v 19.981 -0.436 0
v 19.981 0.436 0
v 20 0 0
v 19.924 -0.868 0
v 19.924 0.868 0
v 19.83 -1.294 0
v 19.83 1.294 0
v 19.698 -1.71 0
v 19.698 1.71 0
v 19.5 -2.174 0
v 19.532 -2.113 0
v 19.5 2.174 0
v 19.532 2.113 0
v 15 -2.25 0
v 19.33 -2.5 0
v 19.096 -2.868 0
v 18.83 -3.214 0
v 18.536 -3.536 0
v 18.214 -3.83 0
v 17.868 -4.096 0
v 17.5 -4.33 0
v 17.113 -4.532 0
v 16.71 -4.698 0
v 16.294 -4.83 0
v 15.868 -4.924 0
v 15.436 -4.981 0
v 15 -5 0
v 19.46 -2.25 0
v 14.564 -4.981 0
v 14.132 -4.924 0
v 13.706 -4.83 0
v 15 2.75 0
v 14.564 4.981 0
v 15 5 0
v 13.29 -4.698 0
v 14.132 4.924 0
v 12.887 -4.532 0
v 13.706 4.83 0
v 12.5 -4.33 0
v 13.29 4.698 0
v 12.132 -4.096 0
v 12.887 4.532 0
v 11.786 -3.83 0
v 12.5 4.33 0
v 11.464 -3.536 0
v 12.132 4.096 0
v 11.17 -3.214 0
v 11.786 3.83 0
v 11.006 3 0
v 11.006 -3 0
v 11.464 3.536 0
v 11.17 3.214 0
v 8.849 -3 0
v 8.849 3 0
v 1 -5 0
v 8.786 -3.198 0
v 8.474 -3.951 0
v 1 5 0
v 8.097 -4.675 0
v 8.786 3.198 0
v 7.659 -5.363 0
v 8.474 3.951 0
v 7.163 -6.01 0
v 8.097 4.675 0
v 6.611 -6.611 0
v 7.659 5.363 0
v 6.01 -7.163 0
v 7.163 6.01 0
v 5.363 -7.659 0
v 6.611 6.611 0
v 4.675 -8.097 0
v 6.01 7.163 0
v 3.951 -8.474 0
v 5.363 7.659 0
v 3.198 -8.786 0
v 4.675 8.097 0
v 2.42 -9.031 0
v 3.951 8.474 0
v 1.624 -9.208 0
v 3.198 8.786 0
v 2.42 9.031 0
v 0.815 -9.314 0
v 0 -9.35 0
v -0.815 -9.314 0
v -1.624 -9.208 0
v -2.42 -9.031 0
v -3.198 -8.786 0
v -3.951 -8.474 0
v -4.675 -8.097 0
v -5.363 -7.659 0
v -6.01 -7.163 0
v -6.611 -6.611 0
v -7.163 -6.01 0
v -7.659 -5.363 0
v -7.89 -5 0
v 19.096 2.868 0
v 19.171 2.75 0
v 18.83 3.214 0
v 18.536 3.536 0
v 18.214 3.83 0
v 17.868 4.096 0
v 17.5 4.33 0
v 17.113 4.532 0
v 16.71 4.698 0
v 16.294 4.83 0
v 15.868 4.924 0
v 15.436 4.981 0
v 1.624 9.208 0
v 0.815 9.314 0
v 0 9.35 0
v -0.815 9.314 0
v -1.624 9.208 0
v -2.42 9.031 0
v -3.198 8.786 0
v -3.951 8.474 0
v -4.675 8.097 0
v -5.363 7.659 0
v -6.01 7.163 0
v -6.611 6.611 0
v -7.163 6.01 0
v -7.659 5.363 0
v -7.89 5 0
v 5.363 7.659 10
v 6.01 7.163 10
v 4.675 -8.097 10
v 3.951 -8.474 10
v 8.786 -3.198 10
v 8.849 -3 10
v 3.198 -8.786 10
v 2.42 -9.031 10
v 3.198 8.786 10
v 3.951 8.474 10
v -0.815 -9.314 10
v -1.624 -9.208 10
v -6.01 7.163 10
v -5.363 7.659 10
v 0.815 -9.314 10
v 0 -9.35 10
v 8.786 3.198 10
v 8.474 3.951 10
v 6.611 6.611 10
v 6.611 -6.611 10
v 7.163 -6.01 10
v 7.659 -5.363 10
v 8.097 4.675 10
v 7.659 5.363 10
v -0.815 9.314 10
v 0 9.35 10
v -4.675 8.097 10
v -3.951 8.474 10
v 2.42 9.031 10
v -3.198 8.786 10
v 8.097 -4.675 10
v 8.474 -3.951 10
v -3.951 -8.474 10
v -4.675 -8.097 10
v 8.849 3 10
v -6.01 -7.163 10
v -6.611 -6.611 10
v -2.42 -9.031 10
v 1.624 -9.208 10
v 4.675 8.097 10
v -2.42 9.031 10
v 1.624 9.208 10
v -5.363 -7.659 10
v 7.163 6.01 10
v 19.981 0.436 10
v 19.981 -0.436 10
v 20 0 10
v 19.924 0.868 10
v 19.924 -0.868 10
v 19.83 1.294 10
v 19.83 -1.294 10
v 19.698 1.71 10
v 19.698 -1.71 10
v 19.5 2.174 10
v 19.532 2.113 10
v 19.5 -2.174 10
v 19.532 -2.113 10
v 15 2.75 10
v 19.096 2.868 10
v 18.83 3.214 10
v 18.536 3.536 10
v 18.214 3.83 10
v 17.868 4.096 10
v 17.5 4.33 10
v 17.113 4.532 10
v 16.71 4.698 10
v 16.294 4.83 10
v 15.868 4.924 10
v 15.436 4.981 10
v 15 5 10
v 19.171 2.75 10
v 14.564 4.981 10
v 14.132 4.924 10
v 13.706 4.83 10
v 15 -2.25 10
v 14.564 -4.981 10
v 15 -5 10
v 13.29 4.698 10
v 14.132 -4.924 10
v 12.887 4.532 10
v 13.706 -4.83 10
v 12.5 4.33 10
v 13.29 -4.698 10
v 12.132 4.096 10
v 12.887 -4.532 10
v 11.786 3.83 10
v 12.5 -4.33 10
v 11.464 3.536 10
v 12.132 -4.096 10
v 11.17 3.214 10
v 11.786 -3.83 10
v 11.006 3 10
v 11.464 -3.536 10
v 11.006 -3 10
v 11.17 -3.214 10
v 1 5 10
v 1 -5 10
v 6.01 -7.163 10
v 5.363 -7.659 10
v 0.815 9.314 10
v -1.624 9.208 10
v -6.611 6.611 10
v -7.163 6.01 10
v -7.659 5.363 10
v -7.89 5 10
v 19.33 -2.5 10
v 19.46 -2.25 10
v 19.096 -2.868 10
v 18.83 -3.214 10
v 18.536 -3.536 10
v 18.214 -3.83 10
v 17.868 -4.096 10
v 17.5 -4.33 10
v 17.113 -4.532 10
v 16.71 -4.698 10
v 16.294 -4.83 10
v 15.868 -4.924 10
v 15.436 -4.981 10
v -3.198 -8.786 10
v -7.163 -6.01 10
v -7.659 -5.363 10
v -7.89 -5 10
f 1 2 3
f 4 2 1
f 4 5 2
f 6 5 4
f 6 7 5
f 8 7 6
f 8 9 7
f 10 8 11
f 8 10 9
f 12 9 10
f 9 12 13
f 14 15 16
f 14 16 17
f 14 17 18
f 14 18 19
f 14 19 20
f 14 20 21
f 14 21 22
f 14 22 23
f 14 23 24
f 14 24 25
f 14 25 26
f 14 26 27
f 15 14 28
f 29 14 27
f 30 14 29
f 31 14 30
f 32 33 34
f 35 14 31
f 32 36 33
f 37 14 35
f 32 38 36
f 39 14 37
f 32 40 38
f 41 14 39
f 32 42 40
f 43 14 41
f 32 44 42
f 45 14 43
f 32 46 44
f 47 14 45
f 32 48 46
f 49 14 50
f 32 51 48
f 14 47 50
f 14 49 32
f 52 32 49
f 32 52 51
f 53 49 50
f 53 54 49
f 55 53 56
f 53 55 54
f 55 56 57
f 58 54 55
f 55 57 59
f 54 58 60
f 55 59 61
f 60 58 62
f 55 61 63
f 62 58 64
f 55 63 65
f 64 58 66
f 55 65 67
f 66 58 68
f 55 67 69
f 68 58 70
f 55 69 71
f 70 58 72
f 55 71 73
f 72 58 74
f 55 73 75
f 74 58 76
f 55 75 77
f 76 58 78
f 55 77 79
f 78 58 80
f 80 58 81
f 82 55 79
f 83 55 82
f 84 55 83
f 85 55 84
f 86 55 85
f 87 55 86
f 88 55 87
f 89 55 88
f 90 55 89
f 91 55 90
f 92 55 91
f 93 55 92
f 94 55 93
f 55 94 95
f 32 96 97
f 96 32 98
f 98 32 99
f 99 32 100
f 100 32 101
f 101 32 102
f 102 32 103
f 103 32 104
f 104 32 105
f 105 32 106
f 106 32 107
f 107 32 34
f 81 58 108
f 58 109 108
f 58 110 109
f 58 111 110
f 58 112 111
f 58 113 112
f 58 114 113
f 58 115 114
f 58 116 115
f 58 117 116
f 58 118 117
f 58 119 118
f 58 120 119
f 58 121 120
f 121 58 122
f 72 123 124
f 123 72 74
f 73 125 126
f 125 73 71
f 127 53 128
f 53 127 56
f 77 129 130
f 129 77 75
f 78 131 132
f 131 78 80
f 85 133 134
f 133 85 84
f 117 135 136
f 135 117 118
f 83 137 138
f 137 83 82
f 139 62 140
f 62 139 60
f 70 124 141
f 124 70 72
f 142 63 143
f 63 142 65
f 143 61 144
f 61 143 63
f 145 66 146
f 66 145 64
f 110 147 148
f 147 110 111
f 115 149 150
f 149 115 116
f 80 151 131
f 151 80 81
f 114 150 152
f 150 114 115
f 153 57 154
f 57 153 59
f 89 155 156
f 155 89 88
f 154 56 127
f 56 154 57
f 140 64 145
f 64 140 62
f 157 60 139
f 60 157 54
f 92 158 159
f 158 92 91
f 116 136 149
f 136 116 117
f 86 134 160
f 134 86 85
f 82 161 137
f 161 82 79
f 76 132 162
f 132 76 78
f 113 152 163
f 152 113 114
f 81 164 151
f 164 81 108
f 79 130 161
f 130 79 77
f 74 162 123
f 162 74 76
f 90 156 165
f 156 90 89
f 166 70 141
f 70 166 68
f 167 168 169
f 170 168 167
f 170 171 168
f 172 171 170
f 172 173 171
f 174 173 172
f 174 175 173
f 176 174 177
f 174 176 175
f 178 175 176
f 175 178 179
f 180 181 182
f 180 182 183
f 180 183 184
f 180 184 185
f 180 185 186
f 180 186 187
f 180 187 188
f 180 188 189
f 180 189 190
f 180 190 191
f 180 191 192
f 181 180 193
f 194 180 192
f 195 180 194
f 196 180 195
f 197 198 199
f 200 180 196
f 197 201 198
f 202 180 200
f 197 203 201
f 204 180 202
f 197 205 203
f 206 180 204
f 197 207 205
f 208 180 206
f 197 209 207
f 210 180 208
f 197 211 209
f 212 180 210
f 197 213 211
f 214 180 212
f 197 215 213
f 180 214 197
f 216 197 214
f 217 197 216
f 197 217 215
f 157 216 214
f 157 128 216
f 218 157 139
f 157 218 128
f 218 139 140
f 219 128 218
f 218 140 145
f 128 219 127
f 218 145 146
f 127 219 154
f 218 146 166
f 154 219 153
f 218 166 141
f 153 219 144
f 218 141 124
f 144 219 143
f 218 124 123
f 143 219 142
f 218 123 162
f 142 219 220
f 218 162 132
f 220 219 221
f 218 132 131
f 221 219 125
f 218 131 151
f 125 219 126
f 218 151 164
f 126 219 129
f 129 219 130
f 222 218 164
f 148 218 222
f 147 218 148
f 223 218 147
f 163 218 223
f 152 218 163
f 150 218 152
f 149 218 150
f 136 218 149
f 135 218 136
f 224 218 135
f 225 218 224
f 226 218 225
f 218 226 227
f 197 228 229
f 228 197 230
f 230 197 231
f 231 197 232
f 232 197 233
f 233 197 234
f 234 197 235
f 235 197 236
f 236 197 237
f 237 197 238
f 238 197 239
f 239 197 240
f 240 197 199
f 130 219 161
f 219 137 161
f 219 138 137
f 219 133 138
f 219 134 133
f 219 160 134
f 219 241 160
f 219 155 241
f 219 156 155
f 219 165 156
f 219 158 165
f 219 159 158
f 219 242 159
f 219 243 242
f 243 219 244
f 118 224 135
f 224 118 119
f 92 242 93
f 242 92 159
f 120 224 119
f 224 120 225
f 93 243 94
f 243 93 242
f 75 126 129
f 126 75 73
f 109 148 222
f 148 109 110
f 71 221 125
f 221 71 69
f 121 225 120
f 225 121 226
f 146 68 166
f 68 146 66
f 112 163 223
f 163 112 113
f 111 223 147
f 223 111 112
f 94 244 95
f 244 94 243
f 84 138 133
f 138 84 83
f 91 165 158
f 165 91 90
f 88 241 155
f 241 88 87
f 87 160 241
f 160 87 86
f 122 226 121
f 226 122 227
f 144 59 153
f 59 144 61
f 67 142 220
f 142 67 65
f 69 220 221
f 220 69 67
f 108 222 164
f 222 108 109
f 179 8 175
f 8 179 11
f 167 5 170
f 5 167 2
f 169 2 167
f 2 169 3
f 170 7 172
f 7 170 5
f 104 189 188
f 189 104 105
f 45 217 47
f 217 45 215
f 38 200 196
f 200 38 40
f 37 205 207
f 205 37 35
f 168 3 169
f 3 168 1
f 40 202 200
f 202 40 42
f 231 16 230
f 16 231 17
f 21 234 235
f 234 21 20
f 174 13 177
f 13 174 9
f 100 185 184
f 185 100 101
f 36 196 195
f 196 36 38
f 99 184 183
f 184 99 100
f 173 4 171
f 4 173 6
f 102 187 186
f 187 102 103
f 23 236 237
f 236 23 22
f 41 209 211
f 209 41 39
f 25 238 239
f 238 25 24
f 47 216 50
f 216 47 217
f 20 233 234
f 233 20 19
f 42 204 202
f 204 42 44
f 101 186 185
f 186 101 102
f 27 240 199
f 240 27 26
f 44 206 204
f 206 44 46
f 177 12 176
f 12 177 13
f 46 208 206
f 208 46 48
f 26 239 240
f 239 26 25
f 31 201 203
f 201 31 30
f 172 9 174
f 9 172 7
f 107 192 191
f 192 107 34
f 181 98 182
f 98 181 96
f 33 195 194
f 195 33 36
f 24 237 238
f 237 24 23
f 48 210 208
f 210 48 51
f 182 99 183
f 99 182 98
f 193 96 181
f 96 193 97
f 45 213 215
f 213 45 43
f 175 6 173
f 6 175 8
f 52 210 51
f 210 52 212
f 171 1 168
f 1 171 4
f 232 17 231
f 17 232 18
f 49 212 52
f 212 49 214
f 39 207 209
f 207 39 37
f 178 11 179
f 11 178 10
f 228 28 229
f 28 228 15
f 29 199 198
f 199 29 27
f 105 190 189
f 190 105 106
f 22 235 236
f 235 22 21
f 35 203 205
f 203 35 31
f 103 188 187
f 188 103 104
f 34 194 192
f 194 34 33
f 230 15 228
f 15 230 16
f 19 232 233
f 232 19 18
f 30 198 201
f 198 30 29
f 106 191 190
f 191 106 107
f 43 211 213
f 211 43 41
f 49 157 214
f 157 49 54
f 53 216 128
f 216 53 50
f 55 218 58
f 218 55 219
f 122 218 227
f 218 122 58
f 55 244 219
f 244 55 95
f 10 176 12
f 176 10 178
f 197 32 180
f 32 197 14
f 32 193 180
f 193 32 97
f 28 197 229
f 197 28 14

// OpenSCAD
// Stand-off clip - a profile extruded through a panel, with a rod ring (for a 12.7 mm / 1/2 inch
// stand rod) and a tubing ring (for 6 mm wall tubing), joined by a solid bridge. The rod ring has
// an opening on the -X side so it snaps onto the rod. NOVEL general part.
//

rod_d     = 12.7;
ring_wall = 3;
tub_d     = 6;
tub_wall  = 2;
bridge_w  = 6;
height    = 10;

$fn = 72;

ring_o = rod_d + 2 * ring_wall;
tub_o  = tub_d + 2 * tub_wall;

difference() {
    union() {
        cylinder(h = height, d = ring_o);                 // rod ring
        translate([15, 0, 0]) cylinder(h = height, d = tub_o);   // tubing ring
        translate([8, -3, 0]) cube([4, 6, height]);                     // bridge (y +/- 3)
    }
    // Open the rod ring: remove x < 0 and |y| < 5 (a wall ~1.3 mm thick remains)
    translate([-ring_o - 1, -5, 0]) cube([ring_o + 2, 10, height + 1]);
    // Open the tubing ring: remove x > 15 and |y| < 2.25 (a wall ~1.2 mm remains)
    translate([15, -2.25, 0]) cube([4.5, 5, height + 1]);
}
